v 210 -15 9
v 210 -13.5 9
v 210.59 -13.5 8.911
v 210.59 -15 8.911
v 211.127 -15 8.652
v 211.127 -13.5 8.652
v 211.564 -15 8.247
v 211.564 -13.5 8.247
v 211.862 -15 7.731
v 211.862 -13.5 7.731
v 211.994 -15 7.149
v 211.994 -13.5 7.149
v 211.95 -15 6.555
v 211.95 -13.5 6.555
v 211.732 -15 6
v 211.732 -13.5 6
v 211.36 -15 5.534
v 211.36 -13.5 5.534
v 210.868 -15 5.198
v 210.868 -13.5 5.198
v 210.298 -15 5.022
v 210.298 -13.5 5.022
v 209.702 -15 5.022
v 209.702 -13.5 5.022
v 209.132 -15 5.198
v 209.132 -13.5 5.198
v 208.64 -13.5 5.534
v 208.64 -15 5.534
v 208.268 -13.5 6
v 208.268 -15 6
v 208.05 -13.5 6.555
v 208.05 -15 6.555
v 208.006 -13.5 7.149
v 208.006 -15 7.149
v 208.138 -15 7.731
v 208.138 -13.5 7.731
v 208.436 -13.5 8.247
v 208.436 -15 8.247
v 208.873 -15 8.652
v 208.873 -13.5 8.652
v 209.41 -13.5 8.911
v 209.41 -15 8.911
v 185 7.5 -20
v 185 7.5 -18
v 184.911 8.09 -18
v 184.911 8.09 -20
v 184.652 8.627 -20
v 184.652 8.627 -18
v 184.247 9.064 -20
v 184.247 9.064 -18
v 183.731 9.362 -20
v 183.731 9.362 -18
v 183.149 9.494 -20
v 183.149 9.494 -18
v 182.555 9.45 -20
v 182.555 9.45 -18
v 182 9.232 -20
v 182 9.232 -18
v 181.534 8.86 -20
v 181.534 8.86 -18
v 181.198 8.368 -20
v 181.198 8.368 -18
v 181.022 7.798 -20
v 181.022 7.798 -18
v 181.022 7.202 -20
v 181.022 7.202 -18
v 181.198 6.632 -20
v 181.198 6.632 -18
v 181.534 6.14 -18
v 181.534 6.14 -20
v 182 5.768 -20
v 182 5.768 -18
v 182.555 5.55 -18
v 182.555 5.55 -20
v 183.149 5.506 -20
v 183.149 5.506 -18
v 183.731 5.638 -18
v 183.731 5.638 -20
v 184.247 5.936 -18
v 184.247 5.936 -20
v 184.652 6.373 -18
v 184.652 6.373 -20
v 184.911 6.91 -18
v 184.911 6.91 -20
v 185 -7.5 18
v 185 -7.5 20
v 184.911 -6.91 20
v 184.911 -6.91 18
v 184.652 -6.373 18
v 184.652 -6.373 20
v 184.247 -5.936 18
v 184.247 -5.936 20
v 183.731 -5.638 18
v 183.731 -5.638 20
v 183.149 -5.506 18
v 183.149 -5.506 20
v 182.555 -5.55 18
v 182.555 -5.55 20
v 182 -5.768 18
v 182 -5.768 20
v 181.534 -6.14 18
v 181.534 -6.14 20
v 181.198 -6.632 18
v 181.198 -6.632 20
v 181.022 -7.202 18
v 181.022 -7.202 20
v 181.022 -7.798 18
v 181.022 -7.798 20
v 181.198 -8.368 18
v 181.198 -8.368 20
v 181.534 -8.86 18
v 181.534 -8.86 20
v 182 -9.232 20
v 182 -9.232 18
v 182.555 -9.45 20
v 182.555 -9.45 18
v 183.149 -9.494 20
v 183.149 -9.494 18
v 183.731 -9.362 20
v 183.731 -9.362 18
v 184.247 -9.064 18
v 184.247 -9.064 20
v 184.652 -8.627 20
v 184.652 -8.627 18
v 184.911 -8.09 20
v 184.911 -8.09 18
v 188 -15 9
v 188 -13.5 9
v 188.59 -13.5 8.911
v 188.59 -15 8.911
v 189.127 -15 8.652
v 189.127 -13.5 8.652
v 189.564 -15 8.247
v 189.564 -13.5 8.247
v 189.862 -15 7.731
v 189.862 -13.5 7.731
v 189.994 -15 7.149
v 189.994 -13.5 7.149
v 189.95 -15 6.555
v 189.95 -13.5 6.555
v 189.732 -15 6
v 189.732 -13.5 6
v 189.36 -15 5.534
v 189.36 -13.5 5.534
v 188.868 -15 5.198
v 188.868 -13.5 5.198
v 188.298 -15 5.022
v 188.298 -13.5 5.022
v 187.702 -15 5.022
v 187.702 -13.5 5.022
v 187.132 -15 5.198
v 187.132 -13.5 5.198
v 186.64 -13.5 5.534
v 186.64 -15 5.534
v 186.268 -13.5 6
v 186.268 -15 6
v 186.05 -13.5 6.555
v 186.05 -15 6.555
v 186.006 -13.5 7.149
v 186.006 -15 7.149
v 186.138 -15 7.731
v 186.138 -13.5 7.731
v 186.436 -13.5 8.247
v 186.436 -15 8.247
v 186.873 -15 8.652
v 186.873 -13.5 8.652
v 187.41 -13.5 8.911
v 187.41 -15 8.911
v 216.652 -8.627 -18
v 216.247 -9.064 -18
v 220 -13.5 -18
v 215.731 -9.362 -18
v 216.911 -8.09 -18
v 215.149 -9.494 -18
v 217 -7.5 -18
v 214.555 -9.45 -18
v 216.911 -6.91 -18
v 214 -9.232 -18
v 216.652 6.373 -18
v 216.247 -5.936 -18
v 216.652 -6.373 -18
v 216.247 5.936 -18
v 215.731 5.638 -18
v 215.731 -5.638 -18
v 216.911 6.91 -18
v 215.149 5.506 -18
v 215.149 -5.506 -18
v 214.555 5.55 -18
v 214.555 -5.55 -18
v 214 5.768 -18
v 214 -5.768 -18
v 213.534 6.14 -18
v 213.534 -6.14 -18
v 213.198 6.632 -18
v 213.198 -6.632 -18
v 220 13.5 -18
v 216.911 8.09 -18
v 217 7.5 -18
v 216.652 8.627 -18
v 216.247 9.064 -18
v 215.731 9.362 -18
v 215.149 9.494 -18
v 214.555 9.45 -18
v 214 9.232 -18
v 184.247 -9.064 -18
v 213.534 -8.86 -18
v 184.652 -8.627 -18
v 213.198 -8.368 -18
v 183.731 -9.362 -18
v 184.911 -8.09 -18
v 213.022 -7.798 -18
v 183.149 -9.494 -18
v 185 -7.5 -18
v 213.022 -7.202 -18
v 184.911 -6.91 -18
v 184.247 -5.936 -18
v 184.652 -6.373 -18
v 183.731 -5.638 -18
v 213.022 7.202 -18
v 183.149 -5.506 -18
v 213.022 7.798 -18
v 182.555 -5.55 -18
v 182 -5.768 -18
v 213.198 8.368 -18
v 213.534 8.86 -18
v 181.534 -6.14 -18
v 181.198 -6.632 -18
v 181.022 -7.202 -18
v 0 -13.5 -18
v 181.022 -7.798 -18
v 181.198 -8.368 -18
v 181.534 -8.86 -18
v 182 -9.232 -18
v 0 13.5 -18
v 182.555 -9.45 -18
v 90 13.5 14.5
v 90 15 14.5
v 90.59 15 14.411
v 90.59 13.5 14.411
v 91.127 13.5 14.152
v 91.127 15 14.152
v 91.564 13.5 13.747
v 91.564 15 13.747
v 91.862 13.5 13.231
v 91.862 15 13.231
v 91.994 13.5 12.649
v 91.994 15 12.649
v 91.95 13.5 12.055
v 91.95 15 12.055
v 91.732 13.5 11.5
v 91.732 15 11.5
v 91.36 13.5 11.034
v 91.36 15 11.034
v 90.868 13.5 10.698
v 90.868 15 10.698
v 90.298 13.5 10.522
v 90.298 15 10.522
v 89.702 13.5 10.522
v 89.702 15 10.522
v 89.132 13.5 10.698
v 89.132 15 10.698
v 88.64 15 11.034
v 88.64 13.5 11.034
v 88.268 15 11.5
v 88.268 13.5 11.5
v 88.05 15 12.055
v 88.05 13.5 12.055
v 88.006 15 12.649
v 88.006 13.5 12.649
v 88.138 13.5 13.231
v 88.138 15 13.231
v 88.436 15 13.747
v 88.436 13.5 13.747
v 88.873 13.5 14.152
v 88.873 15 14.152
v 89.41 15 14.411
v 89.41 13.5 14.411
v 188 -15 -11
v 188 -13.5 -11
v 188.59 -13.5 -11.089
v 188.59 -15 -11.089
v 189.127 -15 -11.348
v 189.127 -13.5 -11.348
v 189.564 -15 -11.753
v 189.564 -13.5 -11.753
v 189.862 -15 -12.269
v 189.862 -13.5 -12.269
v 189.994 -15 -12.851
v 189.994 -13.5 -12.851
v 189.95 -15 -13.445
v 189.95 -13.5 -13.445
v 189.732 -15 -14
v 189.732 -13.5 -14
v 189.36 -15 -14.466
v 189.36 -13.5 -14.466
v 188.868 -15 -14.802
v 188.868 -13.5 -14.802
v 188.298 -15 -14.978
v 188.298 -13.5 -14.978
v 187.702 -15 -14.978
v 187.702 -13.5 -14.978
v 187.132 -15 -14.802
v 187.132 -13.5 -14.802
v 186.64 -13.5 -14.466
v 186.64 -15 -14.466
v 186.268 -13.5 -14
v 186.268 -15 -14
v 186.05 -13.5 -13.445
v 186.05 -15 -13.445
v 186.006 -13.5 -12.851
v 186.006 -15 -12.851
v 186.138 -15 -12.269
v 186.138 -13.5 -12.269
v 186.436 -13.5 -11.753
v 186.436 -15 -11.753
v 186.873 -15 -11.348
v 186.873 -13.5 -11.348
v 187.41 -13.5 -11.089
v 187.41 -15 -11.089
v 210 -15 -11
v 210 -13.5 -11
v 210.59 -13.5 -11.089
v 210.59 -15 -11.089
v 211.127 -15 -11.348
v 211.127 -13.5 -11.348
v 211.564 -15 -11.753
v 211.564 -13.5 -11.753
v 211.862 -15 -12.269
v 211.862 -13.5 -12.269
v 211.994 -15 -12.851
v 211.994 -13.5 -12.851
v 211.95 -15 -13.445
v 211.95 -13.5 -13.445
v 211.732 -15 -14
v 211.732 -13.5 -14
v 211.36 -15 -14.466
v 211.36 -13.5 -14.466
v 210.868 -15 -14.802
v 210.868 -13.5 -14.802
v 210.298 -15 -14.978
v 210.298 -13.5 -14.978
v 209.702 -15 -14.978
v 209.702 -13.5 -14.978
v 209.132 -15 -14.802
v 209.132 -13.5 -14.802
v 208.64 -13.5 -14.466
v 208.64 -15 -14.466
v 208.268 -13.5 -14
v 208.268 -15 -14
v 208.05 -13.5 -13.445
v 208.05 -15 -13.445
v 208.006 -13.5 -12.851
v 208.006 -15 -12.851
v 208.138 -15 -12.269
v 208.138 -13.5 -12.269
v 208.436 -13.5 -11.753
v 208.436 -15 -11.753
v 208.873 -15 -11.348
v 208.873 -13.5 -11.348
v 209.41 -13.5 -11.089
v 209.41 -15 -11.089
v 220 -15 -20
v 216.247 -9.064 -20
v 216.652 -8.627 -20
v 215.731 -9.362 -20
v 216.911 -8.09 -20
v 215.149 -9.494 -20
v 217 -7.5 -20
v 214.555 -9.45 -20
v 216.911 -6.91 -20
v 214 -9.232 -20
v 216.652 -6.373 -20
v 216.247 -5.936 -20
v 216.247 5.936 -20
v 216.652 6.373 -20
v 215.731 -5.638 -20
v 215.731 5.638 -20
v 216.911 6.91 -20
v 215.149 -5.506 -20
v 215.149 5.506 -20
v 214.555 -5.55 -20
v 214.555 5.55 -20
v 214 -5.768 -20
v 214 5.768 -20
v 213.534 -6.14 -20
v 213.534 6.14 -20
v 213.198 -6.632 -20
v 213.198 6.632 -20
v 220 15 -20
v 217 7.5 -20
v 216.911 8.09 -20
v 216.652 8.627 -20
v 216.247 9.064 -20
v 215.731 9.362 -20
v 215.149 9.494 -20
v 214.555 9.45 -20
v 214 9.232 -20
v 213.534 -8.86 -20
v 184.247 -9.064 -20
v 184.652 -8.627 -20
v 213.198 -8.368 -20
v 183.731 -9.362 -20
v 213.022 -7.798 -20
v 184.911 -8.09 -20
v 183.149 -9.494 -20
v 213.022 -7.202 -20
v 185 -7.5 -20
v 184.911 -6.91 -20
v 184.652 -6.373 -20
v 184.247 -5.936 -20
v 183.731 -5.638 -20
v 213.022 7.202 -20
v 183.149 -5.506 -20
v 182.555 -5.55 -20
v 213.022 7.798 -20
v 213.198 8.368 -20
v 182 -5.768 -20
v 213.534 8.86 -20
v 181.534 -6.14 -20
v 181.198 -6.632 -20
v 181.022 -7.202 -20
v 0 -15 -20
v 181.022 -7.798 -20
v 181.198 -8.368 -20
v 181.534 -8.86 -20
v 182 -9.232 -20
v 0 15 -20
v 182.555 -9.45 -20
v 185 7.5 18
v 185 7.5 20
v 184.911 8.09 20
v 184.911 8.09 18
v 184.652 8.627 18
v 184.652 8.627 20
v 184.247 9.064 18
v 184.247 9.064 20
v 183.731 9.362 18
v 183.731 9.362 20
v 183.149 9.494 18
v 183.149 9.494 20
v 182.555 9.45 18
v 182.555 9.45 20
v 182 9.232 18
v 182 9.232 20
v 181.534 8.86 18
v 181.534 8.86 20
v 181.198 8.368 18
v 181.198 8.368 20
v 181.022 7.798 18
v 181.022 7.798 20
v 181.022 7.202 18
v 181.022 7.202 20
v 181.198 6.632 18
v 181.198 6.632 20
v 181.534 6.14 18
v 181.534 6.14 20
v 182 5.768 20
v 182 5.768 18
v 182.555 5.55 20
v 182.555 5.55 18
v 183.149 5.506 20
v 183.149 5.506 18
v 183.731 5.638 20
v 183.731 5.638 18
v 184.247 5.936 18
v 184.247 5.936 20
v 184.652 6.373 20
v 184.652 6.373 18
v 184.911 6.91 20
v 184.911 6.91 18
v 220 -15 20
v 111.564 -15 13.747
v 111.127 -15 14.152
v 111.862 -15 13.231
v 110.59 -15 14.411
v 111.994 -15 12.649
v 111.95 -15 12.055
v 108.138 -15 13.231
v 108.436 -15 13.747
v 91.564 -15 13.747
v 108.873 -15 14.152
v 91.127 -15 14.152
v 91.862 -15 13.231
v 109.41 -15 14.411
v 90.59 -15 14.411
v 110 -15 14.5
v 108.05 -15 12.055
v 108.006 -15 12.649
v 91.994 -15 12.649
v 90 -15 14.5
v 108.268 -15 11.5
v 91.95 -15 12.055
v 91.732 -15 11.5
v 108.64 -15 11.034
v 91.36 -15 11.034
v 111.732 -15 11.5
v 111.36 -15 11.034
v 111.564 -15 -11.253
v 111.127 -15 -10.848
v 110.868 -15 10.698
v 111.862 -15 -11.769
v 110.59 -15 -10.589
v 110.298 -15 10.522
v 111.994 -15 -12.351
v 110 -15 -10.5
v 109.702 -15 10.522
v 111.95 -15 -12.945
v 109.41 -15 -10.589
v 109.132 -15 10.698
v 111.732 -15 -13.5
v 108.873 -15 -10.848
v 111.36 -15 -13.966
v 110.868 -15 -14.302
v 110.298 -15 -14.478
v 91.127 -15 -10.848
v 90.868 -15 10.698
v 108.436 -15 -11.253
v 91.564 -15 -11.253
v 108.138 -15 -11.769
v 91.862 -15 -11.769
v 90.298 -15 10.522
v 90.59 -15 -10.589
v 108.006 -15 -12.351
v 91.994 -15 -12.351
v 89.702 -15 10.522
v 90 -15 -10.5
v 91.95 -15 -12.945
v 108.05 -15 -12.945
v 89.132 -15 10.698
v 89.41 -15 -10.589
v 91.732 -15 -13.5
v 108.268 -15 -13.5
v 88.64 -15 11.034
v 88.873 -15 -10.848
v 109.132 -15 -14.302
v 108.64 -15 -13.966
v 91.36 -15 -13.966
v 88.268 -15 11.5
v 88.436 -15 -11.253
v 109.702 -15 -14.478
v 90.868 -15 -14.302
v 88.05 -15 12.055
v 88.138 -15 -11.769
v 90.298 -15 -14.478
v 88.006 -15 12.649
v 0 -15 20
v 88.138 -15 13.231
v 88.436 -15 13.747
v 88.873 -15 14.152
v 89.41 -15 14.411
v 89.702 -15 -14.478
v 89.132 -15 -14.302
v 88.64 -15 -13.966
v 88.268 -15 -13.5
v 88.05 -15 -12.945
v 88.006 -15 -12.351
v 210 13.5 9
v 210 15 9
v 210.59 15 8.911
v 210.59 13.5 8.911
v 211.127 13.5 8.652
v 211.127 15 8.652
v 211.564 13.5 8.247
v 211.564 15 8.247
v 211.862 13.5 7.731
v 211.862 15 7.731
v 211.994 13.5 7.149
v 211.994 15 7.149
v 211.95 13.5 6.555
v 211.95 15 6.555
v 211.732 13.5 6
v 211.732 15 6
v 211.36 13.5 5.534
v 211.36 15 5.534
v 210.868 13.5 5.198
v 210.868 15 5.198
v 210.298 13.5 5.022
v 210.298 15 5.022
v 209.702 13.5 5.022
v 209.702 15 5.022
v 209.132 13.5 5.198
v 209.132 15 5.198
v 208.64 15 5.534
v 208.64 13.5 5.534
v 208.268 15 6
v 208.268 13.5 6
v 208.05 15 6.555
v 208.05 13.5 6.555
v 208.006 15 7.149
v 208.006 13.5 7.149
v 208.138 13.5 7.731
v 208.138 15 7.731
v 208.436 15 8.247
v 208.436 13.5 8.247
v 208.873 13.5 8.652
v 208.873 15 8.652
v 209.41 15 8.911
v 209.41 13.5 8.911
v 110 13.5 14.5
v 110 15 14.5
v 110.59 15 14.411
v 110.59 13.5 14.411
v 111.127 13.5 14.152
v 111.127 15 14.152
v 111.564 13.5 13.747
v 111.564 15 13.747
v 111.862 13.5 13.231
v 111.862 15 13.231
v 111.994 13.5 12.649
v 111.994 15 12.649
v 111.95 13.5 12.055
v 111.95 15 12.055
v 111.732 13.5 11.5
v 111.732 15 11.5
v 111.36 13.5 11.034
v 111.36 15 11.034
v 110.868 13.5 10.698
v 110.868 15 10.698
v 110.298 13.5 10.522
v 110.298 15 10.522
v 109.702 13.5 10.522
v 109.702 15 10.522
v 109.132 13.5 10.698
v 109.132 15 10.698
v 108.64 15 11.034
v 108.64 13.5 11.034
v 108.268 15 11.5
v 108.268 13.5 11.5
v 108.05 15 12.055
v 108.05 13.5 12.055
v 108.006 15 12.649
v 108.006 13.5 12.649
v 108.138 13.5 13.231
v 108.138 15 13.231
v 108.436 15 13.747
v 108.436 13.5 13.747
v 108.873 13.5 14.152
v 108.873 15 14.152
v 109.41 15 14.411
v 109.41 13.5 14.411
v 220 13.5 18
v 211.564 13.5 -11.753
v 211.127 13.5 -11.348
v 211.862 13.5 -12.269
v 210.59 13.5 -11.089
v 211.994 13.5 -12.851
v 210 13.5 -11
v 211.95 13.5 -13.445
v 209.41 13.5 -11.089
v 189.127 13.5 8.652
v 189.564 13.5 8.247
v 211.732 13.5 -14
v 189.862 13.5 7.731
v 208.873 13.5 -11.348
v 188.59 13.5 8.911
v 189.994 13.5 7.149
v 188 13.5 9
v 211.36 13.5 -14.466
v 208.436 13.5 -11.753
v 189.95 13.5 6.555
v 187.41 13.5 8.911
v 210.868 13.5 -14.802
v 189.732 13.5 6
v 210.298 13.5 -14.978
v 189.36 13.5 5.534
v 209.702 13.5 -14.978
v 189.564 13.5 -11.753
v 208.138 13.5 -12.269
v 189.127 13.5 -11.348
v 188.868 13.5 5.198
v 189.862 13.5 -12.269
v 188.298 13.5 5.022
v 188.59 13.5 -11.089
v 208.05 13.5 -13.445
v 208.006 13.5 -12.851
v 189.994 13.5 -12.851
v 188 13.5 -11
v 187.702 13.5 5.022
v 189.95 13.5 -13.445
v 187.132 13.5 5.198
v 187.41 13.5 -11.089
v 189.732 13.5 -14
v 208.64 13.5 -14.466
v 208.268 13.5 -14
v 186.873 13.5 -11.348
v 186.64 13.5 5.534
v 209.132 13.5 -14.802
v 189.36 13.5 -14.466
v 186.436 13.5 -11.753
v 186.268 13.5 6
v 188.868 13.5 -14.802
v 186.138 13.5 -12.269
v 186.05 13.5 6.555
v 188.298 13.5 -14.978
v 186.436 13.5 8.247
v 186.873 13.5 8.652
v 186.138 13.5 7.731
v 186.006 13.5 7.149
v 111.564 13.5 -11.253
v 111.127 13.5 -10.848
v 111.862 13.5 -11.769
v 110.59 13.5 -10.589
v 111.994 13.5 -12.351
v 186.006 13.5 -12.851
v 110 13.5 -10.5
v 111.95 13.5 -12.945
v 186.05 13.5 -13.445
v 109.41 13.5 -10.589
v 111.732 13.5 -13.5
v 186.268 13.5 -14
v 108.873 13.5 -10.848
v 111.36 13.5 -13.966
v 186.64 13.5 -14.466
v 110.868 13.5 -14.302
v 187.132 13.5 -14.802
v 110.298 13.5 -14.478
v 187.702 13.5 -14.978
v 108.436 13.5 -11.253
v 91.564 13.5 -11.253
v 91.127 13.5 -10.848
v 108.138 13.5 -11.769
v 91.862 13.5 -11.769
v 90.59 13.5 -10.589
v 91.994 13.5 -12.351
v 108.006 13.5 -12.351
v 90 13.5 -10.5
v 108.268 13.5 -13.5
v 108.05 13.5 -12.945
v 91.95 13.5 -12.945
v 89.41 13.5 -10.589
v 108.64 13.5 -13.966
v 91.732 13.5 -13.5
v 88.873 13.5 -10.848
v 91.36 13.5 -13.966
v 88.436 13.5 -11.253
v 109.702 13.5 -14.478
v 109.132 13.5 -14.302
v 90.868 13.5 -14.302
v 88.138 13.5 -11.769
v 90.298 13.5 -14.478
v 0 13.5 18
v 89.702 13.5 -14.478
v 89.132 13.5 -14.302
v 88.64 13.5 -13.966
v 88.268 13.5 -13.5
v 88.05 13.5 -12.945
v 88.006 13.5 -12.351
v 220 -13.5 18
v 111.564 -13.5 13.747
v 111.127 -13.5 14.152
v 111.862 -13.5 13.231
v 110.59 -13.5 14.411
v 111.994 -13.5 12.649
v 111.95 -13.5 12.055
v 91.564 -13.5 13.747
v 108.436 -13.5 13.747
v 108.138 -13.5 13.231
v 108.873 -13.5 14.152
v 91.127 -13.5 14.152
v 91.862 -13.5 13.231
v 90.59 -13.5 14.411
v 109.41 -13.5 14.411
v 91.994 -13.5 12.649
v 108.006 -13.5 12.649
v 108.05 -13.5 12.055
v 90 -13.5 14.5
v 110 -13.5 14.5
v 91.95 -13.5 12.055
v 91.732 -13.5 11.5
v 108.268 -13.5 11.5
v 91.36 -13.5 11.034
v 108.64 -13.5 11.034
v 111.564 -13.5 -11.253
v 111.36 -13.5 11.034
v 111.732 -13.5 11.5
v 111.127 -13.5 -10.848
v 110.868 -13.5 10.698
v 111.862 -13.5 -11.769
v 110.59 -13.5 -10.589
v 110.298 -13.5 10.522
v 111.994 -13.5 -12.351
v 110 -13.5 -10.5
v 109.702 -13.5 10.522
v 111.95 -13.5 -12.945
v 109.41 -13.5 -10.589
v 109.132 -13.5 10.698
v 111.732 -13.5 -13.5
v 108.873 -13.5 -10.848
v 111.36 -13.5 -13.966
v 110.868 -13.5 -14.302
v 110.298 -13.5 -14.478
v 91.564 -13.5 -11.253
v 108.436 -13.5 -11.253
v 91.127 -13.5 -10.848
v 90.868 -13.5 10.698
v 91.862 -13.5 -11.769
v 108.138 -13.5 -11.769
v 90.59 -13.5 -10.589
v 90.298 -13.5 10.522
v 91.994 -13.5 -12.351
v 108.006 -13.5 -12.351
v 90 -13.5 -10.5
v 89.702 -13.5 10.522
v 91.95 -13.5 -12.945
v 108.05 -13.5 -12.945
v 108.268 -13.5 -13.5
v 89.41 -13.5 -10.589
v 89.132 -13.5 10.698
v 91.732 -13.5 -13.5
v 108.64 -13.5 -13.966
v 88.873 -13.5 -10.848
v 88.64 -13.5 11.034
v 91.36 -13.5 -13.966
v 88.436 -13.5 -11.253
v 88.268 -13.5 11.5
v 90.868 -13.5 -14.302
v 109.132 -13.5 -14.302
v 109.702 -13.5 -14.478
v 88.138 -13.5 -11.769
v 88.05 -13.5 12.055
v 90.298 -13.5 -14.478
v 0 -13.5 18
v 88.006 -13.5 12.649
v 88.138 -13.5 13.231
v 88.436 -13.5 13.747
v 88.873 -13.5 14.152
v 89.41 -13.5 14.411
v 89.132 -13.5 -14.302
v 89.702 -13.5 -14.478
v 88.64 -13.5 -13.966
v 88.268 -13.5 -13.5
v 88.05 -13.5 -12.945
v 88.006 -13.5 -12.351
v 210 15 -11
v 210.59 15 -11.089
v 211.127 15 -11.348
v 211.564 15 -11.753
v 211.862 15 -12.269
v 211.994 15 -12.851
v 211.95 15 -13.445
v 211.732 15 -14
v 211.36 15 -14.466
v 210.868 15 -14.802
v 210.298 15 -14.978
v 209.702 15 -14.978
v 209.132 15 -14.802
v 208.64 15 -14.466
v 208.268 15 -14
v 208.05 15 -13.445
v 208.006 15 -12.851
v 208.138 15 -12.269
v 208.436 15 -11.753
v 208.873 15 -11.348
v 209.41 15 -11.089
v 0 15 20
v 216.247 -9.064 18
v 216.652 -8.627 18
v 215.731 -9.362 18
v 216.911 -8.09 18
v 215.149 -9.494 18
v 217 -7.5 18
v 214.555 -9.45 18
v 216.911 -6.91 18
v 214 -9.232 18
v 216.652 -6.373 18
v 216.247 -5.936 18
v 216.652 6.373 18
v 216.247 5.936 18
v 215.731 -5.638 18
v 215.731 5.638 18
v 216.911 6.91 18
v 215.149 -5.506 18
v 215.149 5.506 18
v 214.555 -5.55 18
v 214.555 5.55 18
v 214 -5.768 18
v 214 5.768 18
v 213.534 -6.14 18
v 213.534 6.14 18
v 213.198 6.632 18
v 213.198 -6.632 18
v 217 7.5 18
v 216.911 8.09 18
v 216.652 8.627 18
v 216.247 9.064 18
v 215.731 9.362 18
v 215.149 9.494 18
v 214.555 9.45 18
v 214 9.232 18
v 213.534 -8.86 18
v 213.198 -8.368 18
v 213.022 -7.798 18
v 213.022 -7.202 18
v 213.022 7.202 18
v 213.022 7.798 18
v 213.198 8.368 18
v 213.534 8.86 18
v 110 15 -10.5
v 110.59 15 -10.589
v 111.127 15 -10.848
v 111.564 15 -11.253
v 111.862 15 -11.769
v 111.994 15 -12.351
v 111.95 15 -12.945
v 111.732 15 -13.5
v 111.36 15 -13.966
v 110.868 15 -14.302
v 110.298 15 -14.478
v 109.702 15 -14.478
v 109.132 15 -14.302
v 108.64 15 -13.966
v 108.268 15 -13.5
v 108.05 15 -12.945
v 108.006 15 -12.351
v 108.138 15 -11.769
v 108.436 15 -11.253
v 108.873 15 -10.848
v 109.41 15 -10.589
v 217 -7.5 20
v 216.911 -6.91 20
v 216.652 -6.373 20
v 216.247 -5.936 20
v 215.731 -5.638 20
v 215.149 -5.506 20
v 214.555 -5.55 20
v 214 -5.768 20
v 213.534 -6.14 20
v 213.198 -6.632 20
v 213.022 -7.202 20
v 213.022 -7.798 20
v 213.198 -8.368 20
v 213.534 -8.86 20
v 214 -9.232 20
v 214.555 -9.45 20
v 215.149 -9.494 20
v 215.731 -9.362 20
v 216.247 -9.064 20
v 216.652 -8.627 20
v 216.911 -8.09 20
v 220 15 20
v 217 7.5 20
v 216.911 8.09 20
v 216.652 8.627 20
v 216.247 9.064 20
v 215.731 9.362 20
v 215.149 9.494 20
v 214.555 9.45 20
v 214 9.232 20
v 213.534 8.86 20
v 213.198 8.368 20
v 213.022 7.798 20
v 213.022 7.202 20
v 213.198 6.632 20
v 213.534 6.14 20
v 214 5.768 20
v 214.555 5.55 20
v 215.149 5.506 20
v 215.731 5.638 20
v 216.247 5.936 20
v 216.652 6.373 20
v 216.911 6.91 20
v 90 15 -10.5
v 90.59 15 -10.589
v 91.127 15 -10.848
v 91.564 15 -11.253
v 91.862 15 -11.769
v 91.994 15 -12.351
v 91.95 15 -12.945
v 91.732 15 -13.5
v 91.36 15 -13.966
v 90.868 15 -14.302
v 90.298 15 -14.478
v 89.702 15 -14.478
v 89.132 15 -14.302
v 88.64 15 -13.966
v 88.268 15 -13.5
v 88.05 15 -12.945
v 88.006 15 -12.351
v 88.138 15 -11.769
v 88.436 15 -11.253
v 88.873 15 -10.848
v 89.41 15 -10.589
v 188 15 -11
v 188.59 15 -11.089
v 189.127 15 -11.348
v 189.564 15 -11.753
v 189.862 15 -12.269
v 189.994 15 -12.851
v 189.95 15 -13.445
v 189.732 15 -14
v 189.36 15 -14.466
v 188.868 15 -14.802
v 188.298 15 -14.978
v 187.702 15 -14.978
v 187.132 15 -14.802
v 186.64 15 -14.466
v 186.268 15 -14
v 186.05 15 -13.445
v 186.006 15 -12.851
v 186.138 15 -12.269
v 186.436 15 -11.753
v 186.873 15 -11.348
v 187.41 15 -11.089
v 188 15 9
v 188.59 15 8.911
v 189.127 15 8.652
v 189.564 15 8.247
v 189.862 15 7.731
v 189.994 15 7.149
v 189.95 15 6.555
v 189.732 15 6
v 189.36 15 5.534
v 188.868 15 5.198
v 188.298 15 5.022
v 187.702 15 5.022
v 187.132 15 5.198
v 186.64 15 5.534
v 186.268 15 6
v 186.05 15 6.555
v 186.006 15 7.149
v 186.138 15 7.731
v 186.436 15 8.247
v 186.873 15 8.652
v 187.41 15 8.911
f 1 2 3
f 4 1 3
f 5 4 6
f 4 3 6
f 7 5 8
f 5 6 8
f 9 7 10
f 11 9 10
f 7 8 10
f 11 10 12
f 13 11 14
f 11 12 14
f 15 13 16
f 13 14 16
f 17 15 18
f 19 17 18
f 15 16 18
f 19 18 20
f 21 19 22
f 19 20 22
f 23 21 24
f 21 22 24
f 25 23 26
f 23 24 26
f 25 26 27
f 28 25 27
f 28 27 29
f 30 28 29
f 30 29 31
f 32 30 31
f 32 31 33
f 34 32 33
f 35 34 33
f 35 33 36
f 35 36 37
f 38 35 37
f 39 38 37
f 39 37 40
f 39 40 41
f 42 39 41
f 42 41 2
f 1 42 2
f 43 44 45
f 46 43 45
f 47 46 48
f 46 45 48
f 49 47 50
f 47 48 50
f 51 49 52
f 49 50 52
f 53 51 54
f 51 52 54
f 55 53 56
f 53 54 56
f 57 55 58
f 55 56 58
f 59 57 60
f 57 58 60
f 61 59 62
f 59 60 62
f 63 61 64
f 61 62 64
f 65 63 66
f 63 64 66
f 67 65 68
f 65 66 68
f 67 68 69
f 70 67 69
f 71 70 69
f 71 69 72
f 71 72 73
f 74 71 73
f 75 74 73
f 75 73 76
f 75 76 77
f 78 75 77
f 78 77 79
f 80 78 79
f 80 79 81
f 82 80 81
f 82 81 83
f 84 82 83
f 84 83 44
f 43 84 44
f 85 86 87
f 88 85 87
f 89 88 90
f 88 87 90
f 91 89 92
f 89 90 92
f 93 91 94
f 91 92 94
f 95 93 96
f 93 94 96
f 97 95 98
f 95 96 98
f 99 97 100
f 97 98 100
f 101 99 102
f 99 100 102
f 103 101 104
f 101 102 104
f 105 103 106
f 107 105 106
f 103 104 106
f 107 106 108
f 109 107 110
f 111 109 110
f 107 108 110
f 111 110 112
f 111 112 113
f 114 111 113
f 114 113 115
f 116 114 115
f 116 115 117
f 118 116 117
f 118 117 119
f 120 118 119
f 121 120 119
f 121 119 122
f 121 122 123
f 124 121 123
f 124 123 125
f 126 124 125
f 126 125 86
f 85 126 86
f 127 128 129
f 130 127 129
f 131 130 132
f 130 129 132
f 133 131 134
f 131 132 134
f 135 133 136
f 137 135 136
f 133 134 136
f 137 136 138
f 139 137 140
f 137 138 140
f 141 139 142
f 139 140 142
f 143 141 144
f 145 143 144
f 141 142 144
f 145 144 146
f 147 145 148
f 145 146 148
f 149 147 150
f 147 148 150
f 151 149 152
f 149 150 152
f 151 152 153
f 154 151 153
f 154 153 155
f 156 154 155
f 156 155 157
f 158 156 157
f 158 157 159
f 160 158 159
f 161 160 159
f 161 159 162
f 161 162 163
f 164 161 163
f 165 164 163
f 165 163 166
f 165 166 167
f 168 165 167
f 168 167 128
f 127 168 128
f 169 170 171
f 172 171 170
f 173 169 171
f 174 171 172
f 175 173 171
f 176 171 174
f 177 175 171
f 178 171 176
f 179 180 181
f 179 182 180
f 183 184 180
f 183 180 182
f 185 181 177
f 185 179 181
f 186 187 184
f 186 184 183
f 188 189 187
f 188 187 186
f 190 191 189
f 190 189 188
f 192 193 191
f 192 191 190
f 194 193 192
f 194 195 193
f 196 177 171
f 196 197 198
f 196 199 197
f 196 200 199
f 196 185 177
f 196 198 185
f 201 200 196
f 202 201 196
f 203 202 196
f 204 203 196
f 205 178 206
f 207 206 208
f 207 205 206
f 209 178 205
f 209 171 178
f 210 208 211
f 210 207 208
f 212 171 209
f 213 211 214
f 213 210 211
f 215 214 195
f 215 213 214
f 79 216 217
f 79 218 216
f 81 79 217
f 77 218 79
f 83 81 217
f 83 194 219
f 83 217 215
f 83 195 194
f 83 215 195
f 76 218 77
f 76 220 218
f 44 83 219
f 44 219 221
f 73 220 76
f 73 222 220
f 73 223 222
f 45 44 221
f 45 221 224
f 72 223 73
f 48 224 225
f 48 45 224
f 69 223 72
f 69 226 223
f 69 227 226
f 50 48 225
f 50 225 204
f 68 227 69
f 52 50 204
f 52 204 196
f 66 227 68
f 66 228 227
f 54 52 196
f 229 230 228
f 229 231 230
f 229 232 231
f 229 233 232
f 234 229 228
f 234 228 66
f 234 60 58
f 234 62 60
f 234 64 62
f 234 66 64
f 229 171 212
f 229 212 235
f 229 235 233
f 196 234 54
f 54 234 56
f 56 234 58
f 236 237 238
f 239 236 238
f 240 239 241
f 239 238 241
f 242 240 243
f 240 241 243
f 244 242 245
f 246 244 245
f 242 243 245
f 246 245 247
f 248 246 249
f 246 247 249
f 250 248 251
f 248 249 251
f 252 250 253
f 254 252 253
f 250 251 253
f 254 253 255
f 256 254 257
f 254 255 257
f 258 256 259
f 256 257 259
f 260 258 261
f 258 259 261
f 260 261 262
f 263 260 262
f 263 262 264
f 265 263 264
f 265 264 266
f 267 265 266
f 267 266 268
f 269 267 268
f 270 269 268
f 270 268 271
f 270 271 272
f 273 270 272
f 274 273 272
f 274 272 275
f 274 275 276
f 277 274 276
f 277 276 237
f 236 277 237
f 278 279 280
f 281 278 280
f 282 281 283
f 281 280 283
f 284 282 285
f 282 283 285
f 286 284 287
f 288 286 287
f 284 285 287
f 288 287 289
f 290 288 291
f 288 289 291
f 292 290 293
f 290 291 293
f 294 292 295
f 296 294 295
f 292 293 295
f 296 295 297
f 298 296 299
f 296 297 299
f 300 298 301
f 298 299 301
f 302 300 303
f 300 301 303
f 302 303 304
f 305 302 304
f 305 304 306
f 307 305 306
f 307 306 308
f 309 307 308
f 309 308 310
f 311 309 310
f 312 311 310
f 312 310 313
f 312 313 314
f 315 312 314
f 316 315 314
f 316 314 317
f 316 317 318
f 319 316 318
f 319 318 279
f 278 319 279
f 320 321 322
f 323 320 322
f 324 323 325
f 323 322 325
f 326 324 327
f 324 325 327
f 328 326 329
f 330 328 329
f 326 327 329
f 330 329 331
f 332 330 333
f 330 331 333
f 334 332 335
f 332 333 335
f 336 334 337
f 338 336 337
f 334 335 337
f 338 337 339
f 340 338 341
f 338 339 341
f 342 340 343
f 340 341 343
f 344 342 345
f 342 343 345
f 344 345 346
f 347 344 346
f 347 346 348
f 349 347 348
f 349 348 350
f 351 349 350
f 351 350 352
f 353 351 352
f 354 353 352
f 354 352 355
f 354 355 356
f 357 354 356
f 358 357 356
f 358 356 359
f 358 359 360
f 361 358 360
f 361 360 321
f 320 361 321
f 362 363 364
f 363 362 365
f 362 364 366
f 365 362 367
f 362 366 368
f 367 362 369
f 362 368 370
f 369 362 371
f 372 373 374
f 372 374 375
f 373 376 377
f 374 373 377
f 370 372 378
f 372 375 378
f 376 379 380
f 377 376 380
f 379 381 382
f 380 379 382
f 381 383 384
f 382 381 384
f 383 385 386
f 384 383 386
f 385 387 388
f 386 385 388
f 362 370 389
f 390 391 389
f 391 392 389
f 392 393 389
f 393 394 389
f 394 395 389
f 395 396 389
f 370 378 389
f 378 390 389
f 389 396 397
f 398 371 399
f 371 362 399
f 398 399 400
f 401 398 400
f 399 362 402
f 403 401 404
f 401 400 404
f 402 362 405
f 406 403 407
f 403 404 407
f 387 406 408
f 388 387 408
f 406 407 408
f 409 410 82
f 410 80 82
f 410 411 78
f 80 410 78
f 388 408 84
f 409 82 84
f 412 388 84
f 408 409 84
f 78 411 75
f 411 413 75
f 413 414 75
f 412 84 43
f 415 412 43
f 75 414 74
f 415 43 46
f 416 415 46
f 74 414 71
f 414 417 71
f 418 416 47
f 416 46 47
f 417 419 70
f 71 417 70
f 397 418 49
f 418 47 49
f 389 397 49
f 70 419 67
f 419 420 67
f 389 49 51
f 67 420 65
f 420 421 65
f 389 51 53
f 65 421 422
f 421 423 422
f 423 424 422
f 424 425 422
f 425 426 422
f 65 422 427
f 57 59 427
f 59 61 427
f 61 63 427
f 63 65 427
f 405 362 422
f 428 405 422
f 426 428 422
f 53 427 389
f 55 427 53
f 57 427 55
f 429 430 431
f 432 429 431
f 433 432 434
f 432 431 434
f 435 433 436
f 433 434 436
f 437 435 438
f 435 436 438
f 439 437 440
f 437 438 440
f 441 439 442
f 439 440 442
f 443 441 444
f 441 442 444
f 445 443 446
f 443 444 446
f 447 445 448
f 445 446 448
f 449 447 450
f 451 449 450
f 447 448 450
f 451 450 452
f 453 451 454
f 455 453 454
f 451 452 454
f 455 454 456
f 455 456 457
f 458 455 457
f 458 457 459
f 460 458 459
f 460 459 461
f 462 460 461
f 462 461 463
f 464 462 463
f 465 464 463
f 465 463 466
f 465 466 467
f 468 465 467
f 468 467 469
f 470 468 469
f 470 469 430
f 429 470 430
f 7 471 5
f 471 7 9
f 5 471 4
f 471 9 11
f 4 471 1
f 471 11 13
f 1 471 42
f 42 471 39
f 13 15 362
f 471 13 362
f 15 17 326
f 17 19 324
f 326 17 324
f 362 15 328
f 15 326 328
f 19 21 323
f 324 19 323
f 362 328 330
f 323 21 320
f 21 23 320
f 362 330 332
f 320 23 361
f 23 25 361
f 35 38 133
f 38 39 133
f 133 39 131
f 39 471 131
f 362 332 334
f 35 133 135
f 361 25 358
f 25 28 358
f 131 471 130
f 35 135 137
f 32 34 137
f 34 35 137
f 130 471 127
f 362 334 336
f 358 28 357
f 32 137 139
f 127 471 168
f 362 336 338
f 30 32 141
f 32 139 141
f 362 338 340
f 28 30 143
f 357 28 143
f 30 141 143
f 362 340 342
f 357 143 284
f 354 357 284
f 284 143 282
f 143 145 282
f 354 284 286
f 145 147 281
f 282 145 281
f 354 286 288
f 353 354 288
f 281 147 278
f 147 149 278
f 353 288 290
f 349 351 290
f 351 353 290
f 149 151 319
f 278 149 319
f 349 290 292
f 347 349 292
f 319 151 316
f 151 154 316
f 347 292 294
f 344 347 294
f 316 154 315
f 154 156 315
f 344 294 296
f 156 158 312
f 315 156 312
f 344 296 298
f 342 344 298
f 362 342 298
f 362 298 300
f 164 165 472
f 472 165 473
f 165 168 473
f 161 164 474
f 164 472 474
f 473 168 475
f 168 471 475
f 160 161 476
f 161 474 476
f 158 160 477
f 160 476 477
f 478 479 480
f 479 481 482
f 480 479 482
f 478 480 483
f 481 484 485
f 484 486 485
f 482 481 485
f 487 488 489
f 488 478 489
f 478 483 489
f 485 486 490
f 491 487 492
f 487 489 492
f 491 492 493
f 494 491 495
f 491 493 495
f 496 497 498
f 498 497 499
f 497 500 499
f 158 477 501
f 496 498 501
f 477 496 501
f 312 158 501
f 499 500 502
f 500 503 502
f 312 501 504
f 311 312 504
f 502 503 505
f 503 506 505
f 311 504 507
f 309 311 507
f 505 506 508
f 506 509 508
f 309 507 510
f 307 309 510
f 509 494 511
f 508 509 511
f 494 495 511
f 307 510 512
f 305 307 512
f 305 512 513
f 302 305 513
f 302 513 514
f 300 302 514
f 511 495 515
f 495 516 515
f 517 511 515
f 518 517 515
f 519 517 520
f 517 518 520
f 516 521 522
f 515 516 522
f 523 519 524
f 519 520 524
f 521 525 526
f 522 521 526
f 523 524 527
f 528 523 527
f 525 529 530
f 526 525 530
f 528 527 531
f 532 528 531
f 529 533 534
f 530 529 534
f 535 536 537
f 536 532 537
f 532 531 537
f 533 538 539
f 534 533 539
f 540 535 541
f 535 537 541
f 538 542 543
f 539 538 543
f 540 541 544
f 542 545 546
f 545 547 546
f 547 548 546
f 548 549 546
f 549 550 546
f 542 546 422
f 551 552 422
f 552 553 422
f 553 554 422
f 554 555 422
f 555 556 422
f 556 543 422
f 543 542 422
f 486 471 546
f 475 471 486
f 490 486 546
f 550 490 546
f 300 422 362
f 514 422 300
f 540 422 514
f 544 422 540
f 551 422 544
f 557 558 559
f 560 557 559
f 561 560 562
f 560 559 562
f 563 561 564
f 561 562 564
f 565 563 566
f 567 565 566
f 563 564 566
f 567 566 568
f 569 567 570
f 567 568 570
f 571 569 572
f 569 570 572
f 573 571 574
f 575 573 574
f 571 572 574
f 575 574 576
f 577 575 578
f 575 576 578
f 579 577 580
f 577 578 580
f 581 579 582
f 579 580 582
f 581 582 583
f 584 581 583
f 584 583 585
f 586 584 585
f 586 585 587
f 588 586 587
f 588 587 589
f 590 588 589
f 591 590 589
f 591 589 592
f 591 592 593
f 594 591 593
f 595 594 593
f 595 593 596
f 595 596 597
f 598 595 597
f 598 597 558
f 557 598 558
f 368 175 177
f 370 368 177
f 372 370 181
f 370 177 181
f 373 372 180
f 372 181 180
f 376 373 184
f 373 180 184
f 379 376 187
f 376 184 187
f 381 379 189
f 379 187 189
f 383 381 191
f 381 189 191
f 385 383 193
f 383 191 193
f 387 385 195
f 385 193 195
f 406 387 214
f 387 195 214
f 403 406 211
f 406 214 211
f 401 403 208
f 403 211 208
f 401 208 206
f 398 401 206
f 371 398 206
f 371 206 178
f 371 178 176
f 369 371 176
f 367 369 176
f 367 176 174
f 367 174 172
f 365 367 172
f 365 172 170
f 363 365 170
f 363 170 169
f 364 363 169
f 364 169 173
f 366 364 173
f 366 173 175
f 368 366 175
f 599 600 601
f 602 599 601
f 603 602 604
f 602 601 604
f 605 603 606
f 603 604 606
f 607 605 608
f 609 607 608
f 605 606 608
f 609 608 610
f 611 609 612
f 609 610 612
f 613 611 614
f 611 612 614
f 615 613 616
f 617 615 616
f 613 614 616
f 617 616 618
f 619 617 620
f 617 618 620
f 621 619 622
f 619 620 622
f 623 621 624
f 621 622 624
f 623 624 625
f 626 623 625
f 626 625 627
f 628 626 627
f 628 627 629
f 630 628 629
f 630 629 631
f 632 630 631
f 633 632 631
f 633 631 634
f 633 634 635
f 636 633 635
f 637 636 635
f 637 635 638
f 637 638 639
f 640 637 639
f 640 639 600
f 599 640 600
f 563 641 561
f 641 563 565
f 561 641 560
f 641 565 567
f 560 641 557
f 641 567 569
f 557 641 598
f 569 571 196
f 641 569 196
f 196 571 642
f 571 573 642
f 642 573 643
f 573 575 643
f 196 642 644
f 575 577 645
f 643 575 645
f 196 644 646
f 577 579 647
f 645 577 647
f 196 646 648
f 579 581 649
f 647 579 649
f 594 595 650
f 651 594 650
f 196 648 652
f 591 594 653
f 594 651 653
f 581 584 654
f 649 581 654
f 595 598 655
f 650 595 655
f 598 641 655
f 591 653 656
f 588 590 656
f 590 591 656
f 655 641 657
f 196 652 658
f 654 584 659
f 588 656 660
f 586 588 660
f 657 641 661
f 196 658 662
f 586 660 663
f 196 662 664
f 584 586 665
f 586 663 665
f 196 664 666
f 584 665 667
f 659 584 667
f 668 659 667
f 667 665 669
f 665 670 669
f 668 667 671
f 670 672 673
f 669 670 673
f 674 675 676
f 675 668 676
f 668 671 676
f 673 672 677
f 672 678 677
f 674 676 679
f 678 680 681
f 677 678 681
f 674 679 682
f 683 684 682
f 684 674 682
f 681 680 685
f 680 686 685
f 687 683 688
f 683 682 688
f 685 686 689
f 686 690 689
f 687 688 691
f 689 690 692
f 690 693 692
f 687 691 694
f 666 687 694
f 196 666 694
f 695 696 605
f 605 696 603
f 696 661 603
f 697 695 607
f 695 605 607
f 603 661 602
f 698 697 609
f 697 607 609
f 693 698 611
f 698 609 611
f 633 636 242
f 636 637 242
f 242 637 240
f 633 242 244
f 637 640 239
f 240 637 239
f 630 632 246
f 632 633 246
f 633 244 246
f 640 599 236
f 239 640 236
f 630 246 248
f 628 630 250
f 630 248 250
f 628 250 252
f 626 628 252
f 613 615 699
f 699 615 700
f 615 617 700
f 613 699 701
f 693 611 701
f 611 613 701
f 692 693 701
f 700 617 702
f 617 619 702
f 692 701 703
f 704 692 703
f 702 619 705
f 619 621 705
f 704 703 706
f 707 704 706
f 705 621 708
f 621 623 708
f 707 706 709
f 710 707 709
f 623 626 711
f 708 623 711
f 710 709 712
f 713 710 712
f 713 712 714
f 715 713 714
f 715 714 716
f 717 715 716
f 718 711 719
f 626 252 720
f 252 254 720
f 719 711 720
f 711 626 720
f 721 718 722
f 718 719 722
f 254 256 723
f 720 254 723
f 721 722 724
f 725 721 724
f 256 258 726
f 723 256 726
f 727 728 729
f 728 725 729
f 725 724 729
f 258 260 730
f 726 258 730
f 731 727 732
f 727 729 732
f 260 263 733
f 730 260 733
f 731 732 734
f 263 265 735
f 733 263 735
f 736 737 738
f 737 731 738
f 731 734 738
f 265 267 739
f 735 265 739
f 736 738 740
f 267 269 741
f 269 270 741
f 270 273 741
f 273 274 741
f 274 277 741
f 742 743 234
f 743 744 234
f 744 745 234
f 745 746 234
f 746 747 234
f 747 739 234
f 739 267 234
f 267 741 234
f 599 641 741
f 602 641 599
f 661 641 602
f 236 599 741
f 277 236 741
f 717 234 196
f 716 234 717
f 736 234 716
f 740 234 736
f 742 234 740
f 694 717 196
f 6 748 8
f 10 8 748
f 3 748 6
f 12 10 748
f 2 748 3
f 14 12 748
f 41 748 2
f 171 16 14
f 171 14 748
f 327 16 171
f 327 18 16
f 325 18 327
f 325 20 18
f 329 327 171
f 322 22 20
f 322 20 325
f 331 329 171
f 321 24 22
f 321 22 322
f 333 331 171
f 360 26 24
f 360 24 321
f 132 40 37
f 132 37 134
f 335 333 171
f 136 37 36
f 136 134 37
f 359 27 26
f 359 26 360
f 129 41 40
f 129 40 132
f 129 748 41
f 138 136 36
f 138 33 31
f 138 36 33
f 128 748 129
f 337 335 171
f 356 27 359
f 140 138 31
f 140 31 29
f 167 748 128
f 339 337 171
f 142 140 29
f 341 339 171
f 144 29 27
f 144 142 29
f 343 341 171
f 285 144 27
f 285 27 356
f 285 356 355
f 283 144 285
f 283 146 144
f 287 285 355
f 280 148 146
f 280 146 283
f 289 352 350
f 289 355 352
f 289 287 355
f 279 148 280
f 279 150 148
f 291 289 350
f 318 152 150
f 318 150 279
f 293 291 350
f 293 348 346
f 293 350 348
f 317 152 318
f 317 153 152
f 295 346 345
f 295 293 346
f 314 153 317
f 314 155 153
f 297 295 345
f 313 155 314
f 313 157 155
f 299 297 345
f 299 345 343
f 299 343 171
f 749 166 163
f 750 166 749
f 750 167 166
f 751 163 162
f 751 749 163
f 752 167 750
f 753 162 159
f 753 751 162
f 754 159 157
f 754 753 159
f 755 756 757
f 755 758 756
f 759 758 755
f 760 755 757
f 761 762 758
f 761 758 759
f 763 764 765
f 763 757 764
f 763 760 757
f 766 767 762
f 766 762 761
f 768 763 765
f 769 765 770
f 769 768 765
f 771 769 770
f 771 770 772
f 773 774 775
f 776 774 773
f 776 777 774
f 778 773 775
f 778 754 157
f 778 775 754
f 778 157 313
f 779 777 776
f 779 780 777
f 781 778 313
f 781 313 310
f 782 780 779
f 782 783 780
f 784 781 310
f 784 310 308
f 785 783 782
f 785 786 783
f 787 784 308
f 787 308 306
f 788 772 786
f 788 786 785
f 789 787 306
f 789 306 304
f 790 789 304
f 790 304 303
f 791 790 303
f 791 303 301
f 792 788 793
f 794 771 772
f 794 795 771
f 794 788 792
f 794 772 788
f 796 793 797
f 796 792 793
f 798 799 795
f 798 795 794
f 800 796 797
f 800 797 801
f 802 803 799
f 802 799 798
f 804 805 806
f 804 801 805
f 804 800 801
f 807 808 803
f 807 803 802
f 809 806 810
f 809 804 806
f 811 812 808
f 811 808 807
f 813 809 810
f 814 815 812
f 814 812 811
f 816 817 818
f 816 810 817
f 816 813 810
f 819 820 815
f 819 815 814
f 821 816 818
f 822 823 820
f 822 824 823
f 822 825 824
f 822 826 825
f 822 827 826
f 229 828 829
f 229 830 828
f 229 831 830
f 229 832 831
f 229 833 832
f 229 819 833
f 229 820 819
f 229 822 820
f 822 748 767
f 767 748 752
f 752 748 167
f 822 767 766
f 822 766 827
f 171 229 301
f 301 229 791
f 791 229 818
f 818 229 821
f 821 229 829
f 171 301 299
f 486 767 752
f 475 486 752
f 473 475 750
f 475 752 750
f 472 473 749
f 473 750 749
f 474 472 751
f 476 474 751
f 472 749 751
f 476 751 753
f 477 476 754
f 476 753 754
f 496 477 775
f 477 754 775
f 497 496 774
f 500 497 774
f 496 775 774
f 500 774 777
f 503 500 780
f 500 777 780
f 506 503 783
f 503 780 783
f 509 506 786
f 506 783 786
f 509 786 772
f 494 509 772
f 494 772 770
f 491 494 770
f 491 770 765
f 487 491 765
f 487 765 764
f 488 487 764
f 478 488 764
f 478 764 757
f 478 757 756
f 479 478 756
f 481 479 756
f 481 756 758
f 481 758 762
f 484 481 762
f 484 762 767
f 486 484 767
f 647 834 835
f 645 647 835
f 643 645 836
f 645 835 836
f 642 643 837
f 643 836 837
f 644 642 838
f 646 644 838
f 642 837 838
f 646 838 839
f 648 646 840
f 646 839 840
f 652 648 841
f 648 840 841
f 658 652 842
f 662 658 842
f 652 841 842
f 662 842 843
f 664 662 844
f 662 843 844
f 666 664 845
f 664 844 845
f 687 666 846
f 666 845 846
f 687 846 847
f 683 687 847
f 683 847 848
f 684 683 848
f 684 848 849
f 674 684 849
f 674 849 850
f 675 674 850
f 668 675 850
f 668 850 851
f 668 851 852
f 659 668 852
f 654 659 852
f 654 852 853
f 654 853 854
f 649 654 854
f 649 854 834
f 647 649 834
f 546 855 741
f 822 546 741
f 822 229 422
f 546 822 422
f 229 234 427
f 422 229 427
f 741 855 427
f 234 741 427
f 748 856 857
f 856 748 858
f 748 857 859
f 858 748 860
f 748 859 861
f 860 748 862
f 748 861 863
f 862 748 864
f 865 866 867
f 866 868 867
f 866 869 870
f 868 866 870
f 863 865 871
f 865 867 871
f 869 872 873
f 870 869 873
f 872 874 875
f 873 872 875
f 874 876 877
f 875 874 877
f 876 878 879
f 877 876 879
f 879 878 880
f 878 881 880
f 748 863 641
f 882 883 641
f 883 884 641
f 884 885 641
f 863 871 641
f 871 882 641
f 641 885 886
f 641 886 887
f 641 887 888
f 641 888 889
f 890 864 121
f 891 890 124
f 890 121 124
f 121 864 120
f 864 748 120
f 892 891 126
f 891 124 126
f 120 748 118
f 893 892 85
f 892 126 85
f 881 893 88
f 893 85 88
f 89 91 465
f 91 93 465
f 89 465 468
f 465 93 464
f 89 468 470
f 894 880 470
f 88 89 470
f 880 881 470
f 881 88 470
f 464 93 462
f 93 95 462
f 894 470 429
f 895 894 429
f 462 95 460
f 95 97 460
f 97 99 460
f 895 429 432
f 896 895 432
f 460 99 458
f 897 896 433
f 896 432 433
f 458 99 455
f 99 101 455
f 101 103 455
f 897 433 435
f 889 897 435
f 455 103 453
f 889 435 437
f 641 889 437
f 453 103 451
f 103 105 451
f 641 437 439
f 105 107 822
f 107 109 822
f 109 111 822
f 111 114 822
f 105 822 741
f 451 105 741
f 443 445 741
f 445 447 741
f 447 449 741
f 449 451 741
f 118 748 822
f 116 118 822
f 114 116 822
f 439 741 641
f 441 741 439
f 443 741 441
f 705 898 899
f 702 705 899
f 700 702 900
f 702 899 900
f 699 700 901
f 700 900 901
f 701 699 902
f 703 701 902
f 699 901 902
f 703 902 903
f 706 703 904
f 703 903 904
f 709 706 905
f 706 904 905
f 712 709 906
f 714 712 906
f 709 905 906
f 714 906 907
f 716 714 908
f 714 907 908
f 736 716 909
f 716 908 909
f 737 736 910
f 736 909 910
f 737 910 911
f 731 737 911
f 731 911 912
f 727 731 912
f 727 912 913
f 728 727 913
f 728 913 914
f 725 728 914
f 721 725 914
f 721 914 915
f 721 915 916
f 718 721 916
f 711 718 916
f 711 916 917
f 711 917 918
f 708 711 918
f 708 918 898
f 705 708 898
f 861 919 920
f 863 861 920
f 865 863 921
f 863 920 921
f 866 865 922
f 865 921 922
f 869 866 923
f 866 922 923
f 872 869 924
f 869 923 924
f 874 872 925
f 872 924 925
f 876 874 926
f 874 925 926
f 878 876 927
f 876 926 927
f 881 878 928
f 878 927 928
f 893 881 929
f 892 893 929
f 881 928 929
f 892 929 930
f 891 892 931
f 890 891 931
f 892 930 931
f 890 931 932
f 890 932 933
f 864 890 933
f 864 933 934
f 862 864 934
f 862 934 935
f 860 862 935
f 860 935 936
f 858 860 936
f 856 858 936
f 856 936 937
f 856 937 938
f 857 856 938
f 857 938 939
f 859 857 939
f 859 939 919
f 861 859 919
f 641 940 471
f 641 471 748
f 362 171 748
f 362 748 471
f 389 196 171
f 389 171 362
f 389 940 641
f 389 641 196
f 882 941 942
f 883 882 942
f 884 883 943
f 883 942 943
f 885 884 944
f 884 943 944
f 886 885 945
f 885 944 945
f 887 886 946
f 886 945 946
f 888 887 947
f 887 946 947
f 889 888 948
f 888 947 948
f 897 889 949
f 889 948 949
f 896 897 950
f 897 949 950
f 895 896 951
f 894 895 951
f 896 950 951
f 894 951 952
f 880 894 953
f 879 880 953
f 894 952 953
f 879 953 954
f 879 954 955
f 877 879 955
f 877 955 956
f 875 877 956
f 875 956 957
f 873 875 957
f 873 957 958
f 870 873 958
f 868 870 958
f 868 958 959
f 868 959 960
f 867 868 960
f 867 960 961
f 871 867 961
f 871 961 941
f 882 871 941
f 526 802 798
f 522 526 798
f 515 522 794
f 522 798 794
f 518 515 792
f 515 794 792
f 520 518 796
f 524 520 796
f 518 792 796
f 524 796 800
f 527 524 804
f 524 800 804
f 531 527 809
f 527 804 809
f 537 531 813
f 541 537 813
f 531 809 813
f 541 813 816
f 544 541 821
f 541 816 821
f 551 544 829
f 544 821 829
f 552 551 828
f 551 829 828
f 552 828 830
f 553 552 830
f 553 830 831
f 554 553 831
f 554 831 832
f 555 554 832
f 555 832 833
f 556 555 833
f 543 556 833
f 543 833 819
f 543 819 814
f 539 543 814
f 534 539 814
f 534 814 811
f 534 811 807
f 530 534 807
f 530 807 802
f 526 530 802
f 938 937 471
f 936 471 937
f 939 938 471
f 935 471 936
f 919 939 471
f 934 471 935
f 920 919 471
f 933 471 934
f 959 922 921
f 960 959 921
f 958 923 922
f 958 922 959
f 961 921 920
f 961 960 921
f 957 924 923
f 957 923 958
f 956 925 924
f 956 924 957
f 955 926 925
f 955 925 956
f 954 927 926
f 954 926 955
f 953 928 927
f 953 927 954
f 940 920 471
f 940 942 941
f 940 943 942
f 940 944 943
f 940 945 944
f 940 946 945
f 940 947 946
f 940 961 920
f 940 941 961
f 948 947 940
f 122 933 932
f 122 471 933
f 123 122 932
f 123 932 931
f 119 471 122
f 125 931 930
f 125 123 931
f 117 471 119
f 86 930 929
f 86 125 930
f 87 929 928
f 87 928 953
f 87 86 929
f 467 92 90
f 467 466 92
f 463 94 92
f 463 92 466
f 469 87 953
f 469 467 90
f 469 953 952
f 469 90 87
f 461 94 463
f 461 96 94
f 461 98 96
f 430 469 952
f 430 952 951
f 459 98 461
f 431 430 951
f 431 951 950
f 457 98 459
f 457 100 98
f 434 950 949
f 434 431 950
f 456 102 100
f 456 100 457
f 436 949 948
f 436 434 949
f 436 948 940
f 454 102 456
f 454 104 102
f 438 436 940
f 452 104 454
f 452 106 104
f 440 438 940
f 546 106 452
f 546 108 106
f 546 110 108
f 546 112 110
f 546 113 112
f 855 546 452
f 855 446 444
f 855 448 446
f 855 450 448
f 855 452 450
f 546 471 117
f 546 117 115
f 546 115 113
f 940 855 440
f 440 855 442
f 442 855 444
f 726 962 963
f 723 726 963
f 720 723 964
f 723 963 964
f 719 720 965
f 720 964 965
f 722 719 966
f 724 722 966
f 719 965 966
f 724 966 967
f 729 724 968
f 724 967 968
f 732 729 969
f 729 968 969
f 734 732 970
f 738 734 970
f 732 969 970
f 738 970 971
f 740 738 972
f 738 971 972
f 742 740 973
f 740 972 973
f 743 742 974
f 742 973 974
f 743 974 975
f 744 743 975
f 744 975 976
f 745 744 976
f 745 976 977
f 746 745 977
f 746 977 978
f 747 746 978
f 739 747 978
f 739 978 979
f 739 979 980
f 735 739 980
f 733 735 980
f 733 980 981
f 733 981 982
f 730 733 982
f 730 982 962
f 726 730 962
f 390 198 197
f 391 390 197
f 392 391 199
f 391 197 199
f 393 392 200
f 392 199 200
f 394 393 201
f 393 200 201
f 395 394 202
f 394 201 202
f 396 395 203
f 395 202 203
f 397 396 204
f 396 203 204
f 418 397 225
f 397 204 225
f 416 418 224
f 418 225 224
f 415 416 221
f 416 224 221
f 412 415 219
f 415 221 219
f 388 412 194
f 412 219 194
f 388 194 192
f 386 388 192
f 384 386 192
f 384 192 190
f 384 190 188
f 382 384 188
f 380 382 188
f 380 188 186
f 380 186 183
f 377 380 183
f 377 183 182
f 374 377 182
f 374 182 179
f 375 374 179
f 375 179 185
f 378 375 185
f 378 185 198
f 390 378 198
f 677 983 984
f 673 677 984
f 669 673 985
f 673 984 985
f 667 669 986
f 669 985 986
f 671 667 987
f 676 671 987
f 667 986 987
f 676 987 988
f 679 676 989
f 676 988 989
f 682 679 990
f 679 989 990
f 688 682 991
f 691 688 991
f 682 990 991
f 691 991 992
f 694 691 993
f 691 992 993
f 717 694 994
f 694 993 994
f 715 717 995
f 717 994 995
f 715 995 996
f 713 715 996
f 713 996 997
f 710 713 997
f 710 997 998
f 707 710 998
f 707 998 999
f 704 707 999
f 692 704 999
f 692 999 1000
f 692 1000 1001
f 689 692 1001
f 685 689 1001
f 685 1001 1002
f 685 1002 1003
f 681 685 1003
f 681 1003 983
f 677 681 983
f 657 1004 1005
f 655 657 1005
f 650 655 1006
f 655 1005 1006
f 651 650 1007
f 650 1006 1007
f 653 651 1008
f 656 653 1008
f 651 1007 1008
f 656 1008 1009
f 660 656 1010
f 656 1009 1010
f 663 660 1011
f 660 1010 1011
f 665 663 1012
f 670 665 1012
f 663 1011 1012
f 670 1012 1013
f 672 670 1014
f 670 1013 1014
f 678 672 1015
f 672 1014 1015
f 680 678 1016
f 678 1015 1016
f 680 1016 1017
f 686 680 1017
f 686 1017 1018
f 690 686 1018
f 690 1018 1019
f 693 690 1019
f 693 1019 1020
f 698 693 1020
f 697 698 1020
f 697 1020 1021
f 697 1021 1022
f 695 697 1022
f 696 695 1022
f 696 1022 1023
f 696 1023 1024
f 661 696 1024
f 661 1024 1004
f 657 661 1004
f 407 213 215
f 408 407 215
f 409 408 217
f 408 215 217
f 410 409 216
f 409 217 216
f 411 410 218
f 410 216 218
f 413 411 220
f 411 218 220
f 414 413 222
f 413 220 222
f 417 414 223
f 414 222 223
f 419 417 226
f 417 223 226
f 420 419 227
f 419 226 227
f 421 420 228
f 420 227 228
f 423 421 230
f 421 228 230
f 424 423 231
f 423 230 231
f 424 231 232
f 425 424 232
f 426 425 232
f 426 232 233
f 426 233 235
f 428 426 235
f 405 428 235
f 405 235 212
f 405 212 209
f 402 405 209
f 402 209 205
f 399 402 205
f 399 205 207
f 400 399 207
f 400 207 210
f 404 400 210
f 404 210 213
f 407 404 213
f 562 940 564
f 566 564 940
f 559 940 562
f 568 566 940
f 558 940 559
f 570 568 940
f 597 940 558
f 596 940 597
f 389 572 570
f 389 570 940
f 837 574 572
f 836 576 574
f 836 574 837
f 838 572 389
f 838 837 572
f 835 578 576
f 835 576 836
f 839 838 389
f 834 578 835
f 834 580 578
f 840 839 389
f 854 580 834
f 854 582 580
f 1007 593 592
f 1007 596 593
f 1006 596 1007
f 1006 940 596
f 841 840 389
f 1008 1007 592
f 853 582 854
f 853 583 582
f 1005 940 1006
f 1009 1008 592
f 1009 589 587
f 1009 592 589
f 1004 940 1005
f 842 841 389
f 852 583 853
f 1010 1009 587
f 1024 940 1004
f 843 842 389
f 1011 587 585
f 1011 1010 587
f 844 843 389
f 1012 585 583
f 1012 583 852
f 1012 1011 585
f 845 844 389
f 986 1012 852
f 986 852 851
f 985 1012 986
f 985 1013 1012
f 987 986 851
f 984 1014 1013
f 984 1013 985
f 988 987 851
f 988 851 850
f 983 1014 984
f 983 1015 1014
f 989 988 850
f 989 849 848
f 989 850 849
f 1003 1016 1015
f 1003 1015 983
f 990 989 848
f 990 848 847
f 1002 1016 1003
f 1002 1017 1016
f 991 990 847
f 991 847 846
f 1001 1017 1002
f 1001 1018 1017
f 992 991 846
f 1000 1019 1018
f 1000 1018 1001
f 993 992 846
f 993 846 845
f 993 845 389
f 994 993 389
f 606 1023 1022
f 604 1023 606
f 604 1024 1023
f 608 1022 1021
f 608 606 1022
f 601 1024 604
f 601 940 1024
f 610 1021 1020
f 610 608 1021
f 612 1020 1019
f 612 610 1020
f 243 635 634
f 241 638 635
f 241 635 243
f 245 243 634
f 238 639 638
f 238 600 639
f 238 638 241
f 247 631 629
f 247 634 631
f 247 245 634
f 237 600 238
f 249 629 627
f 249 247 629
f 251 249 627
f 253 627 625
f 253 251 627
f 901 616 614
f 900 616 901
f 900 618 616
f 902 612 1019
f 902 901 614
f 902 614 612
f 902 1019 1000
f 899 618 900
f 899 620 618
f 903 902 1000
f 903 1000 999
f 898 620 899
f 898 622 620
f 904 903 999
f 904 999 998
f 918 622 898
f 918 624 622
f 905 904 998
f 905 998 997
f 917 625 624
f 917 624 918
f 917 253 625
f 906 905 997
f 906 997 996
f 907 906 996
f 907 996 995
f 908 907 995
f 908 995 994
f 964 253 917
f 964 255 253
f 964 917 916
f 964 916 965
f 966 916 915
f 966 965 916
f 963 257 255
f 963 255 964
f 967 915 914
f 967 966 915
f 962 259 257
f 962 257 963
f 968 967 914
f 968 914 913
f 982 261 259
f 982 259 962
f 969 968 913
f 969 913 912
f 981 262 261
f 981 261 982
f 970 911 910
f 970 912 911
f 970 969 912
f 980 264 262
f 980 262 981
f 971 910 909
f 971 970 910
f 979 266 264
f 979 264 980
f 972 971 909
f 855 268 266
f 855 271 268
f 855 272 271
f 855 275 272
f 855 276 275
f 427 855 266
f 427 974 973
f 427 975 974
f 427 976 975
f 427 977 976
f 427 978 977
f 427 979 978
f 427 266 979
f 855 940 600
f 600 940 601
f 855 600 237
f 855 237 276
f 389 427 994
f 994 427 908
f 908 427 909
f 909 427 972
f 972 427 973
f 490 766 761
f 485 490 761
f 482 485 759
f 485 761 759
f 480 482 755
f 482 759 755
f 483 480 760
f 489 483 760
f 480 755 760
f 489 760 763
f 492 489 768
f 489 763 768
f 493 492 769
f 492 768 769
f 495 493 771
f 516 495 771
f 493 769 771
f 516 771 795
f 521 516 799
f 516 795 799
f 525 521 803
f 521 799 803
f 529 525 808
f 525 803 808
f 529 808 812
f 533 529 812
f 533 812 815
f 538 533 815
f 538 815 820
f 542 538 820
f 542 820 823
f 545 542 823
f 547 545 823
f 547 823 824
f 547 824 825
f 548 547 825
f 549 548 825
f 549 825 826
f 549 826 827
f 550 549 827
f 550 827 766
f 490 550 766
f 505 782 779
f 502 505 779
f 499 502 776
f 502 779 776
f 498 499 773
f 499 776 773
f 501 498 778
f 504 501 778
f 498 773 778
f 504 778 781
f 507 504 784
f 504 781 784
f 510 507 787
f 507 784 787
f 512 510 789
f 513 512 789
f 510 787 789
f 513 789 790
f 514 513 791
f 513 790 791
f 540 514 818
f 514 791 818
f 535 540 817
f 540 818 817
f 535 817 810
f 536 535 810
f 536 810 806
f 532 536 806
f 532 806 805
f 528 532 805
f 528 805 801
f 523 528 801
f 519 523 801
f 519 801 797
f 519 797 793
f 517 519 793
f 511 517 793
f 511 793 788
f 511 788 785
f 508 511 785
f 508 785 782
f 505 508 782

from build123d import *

# Parameters (mm, degrees)
SKETCH_1_W          = 40
SKETCH_1_H          = 30
SKETCH_1_W_2        = 36
SKETCH_1_H_2        = 27
EXTRUDE_1_DEPTH     = 220
SKETCH_2_R          = 2
CUT_EXTRUDE_1_DEPTH = 223.934968096
SKETCH_3_R          = 2
CUT_EXTRUDE_2_DEPTH = 223.934968096
SKETCH_4_R          = 2
CUT_EXTRUDE_3_DEPTH = 225.10934831


with BuildPart() as part:
    # 草图1 → 凸台-拉伸1 (new body)
    with BuildSketch(Plane(origin=(0, 0, 0), x_dir=(0, 0, -1), z_dir=(1, 0, 0))):
        Rectangle(SKETCH_1_W, SKETCH_1_H)
        Rectangle(SKETCH_1_W_2, SKETCH_1_H_2, mode=Mode.SUBTRACT)
    extrude(amount=EXTRUDE_1_DEPTH)

    # 草图2 → 切除-拉伸1 (cut, through all)
    with BuildSketch(Plane(origin=(0, 15, 0), x_dir=(1, 0, 0), z_dir=(0, 1, 0))):
        with Locations(Location((210, -7, 0), (0, 0, 270))):
            Circle(SKETCH_2_R)
        with Locations(Location((210, 13, 0), (0, 0, 270))):
            Circle(SKETCH_2_R)
        with Locations(Location((188, 13, 0), (0, 0, 270))):
            Circle(SKETCH_2_R)
        with Locations(Location((188, -7, 0), (0, 0, 270))):
            Circle(SKETCH_2_R)
    extrude(amount=-CUT_EXTRUDE_1_DEPTH, mode=Mode.SUBTRACT)

    # 草图3 → 切除-拉伸2 (cut, through all)
    with BuildSketch(Plane(origin=(0, 15, 0), x_dir=(1, 0, 0), z_dir=(0, 1, 0))):
        with Locations(Location((90, 12.5, 0), (0, 0, 270))):
            Circle(SKETCH_3_R)
        with Locations(Location((110, 12.5, 0), (0, 0, 270))):
            Circle(SKETCH_3_R)
        with Locations(Location((110, -12.5, 0), (0, 0, 270))):
            Circle(SKETCH_3_R)
        with Locations(Location((90, -12.5, 0), (0, 0, 270))):
            Circle(SKETCH_3_R)
    extrude(amount=-CUT_EXTRUDE_2_DEPTH, mode=Mode.SUBTRACT)

    # 草图4 → 切除-拉伸3 (cut, through all)
    with BuildSketch(Plane.XY.offset(20)):
        with Locations((183, 7.5)):
            Circle(SKETCH_4_R)
        with Locations((215, 7.5)):
            Circle(SKETCH_4_R)
        with Locations((215, -7.5)):
            Circle(SKETCH_4_R)
        with Locations((183, -7.5)):
            Circle(SKETCH_4_R)
    extrude(amount=-CUT_EXTRUDE_3_DEPTH, mode=Mode.SUBTRACT)


solid = part.part
